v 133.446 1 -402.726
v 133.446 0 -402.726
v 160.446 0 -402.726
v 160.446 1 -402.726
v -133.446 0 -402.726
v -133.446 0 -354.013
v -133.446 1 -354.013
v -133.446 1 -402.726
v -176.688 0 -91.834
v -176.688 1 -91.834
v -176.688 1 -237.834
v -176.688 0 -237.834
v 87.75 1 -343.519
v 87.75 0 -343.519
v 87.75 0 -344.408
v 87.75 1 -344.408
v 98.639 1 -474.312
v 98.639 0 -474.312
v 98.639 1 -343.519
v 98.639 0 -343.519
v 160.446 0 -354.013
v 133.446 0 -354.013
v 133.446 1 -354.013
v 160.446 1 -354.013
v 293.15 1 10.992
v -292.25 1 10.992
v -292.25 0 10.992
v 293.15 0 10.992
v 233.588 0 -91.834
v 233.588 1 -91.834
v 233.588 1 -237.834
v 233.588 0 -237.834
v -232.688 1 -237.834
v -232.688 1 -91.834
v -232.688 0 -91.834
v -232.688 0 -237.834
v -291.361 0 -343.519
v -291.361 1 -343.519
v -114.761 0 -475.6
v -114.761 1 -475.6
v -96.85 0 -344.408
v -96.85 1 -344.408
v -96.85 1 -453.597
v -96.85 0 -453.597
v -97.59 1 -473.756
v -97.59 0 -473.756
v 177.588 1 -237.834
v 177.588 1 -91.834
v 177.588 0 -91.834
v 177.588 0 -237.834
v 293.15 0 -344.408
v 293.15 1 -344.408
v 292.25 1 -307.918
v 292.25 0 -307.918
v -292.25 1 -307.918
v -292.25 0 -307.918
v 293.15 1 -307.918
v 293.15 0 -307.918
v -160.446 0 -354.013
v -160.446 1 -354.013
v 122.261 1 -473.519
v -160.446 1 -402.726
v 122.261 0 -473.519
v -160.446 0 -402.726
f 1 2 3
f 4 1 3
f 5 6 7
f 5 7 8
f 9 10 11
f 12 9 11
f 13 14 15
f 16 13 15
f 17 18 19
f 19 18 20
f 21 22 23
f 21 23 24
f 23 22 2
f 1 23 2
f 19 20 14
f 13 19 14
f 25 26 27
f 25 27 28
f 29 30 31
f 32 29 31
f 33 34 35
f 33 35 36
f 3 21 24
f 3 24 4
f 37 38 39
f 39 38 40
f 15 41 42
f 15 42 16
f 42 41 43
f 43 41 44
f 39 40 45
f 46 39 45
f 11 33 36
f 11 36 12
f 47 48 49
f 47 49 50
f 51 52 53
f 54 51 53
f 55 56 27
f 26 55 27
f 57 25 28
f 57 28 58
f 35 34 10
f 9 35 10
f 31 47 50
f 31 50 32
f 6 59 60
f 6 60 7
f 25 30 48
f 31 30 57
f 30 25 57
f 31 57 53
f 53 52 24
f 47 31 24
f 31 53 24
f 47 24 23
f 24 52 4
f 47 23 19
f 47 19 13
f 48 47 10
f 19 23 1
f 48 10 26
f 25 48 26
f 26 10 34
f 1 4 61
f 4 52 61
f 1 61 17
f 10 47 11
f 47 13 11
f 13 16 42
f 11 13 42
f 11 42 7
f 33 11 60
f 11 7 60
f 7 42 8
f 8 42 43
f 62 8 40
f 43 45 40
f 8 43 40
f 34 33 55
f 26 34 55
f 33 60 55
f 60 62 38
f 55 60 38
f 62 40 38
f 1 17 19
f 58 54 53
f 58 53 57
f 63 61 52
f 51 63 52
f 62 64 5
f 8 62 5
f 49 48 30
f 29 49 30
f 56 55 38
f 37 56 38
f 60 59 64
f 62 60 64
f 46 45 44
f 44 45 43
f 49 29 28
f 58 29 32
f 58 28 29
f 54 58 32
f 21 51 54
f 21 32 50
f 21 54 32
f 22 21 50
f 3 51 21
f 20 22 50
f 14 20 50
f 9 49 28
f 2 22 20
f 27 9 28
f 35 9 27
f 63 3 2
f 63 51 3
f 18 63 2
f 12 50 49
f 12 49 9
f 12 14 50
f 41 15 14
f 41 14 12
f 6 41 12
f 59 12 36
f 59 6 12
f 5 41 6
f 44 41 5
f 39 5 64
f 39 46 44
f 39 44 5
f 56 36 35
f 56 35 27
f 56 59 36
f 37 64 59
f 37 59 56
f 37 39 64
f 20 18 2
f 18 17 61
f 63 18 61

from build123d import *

# Parameters (mm, degrees)
BOSS_EXTRUDE1_DEPTH     = 1
SKETCH3_W               = 56
SKETCH3_H               = 146
CUT_EXTRUDE2_DEPTH      = 10
CUT_EXTRUDE4_DEPTH      = 607.465859368
CUT_EXTRUDE4_DEPTH_BACK = 607.465859368
SKETCH4_W               = 323.526326174
SKETCH4_H               = 73.784869865
SKETCH5_W               = 0.9
SKETCH5_H               = 318.91
BOSS_EXTRUDE2_DEPTH     = 1
CUT_EXTRUDE6_DEPTH      = 558.674774622
CUT_EXTRUDE6_DEPTH_BACK = 11.5
SKETCH6_W               = 184.6
SKETCH6_H               = 110.039837523
CUT_EXTRUDE7_DEPTH      = 558.674774622
CUT_EXTRUDE7_DEPTH_BACK = 558.674774622
SKETCH7_W               = 27
SKETCH7_H               = 48.713018504
CUT_EXTRUDE8_DEPTH      = 558.674774622
CUT_EXTRUDE8_DEPTH_BACK = 558.674774622
SKETCH8_W               = 268.184865131
SKETCH8_H               = 40.991987157
BOSS_EXTRUDE3_DEPTH     = 1
CUT_EXTRUDE9_DEPTH      = 559.688754003
CUT_EXTRUDE9_DEPTH_BACK = 559.688754003


with BuildPart() as part:
    # Sketch1 → Boss-Extrude1 (new body)
    with BuildSketch(Plane(origin=(0, 0, 0), x_dir=(1, 0, 0), z_dir=(0, 1, 0))):
        Polygon((-292.25, 307.91829646), (-292.25, -10.99170354), (292.25, -10.99170354), (292.25, 307.91829646), (0, 531.403590578), align=None)
    extrude(amount=BOSS_EXTRUDE1_DEPTH)

    # Sketch3 → Cut-Extrude2 (cut)
    with BuildSketch(Plane(origin=(0, 1, 0), x_dir=(1, 0, 0), z_dir=(0, 1, 0))):
        with Locations((-204.688244909, 164.834464834)):
            Rectangle(SKETCH3_W, SKETCH3_H)
        with Locations((205.588244909, 164.834464834)):
            Rectangle(SKETCH3_W, SKETCH3_H)
    extrude(amount=-CUT_EXTRUDE2_DEPTH, mode=Mode.SUBTRACT)

    # Sketch4 → Cut-Extrude4 (cut, two sides: drawn at the far end of the back side and taken through both)
    with BuildSketch(Plane(origin=(0, 1, 0), x_dir=(1, 0, 0), z_dir=(0, 1, 0)).offset(-CUT_EXTRUDE4_DEPTH_BACK)):
        with Locations((-21.051035773, 511.300731392)):
            Rectangle(SKETCH4_W, SKETCH4_H)
    extrude(amount=CUT_EXTRUDE4_DEPTH + CUT_EXTRUDE4_DEPTH_BACK, mode=Mode.SUBTRACT)

    # Sketch5 → Boss-Extrude2 (add)
    with BuildSketch(Plane(origin=(0, 1, 0), x_dir=(1, 0, 0), z_dir=(0, 1, 0))):
        with Locations((292.7, 148.46329646)):
            Rectangle(SKETCH5_W, SKETCH5_H)
    extrude(amount=-BOSS_EXTRUDE2_DEPTH)

    # Sketch6 → Cut-Extrude6 (cut, two sides: drawn at the far end of the back side and taken through both)
    with BuildSketch(Plane(origin=(0, 1, 0), x_dir=(1, 0, 0), z_dir=(0, 1, 0)).offset(-CUT_EXTRUDE6_DEPTH_BACK)):
        with Locations((-4.55, 399.428215222)):
            Rectangle(SKETCH6_W, SKETCH6_H)
    extrude(amount=CUT_EXTRUDE6_DEPTH + CUT_EXTRUDE6_DEPTH_BACK, mode=Mode.SUBTRACT)

    # Sketch7 → Cut-Extrude7 (cut, two sides: drawn at the far end of the back side and taken through both)
    with BuildSketch(Plane(origin=(0, 1, 0), x_dir=(1, 0, 0), z_dir=(0, 1, 0)).offset(-CUT_EXTRUDE7_DEPTH_BACK)):
        with Locations((-146.945577185, 378.369305764)):
            Rectangle(SKETCH7_W, SKETCH7_H)
        with Locations((146.945577185, 378.369305764)):
            Rectangle(SKETCH7_W, SKETCH7_H)
    extrude(amount=CUT_EXTRUDE7_DEPTH + CUT_EXTRUDE7_DEPTH_BACK, mode=Mode.SUBTRACT)

    # Sketch8 → Cut-Extrude8 (cut, two sides: drawn at the far end of the back side and taken through both)
    with BuildSketch(Plane(origin=(0, 1, 0), x_dir=(1, 0, 0), z_dir=(0, 1, 0)).offset(-CUT_EXTRUDE8_DEPTH_BACK)):
        with Locations((19.664678058, 474.092644014)):
            Rectangle(SKETCH8_W, SKETCH8_H)
    extrude(amount=CUT_EXTRUDE8_DEPTH + CUT_EXTRUDE8_DEPTH_BACK, mode=Mode.SUBTRACT)

    # Sketch9 → Boss-Extrude3 (add)
    with BuildSketch(Plane(origin=(0, 1, 0), x_dir=(1, 0, 0), z_dir=(0, 1, 0))):
        Polygon((-292.25, 307.91829646), (-291.361, 343.51929646), (-114.760549692, 475.59983321), (-97.590157883, 473.756060592), (-96.85, 453.596650435), (-101.74753711, 453.596650435), align=None)
        Polygon((87.75, 453.596650435), (87.75, 474.677946901), (122.261, 473.51929646), (293.15, 344.40829646), (292.25, 307.91829646), (101.74753711, 453.596650435), align=None)
    extrude(amount=-BOSS_EXTRUDE3_DEPTH)

    # Sketch10 → Cut-Extrude9 (cut, two sides: drawn at the far end of the back side and taken through both)
    with BuildSketch(Plane(origin=(0, 1, 0), x_dir=(1, 0, 0), z_dir=(0, 1, 0)).offset(-CUT_EXTRUDE9_DEPTH_BACK)):
        Polygon((87.75, 474.677946901), (98.639, 474.40829646), (98.639, 343.51929646), (87.75, 343.51929646), align=None)
    extrude(amount=CUT_EXTRUDE9_DEPTH + CUT_EXTRUDE9_DEPTH_BACK, mode=Mode.SUBTRACT)


solid = part.part
